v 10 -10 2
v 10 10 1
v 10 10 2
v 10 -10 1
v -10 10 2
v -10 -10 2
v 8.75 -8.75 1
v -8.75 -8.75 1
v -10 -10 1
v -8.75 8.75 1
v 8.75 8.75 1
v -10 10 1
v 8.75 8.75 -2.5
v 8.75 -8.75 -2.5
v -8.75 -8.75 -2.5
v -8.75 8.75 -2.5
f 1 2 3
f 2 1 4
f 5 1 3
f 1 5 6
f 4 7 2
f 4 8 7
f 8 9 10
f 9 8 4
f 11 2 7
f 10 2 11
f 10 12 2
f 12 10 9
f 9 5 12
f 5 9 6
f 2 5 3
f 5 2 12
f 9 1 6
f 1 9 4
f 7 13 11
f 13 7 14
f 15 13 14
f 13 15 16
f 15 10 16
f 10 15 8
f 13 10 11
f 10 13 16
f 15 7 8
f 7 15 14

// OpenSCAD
outerSize = 20;
innerSize = 18;
topHeight = 4;
baseHeight = 5;
foamWidth = 5;
foamHeight = 1.0;
spaceY = 2;
thickness = 1;
margin = 1.2;
tightMargin = 0.5;

module top() {
  $fn=100;
  $fs=1;
  translate([0, 0, baseHeight + spaceY])
  difference() {
    translate([0, 0, topHeight/2])
    cube([outerSize, outerSize, topHeight], center=true);
    translate([0, 0, topHeight/2-thickness])
    cube([innerSize, innerSize, topHeight], center=true);
  }

}

module base() {
  $fn=100;
  $fs=1;
  translate([0, 0, baseHeight/2])
  difference() {
    translate([0, 0, 0])
    cube([outerSize, outerSize, baseHeight], center=true);
    translate([0, 0, 0])
    cube([innerSize, innerSize, baseHeight+1], center=true);
  }

}

module buttonTop() {
  $fn=100;
  $fs=1;
  innerHeight = baseHeight - foamHeight - tightMargin;
  translate([0, 0, thickness])
  union() {
    translate([0, 0, thickness/2])
    cube([outerSize, outerSize, thickness], center=true);
    translate([0, 0, -innerHeight/2])
    cube([innerSize-tightMargin, innerSize-tightMargin, innerHeight], center=true);
  }
}

module buttonBottom() {
  $fn=100;
  $fs=1;
  height = baseHeight;
  innerHeight = baseHeight - foamHeight + margin;  
  translate([0, 0, 0])
  difference() {
    union() {
      translate([0, 0, baseHeight/2])
      cube([outerSize, outerSize, baseHeight], center=true);
      translate([0, 0, thickness+thickness/2])
      cube([outerSize/2, outerSize+thickness, thickness], center=true);
      translate([0, 0, thickness+thickness/2])
      cube([outerSize+thickness, outerSize/2, thickness], center=true);
    }
    translate([0, innerSize/2-foamWidth/2, height/2])
    cube([innerSize, foamWidth, height+thickness+1], center=true);
    translate([0, -innerSize/2+foamWidth/2, height/2])
    cube([innerSize, foamWidth, height+thickness+1], center=true);
    translate([0, 0, height/2])
    cube([innerSize, innerSize-foamWidth*2-thickness*2, height+thickness+1], center=true);
    translate([0, 0, innerHeight/2+foamHeight])
    cube([innerSize, innerSize, innerHeight+0.01], center=true);
  }

}

module buttonMountInner(innerWidth, width, height) {
  innerWidth2 = innerWidth + thickness + margin;
    union() {
	    translate([0, 0, height/2])
	    cube([innerWidth, innerWidth, height+1], center=true);
	    #translate([0, 0, thickness*2])
	    cube([innerWidth2, outerSize/2 + margin, thickness*4], center=true);
	    translate([0, 0, thickness*2])
	    cube([outerSize/2 + margin, innerWidth2, thickness*4], center=true);
	    translate([0, 0, thickness-0.5])
	    cube([innerWidth-thickness*2, width+1, thickness*2], center=true);
	    translate([0, 0, thickness-0.5])
	    cube([width+1, innerWidth-thickness*2, thickness*2], center=true);
    }
}

module buttonMount() {
  width = outerSize + thickness*6;
  spacing = 2.0;
  totalWidth = outerSize*2 + spacing*4;
  height = baseHeight;
  innerWidth = outerSize + margin;
  innerWidth2 = outerSize + thickness*2 + margin;
  translate([0, 0, -thickness*4])
  difference() {
    translate([0, 0, height/2])
    cube([totalWidth, totalWidth, height], center=true);

    translate([outerSize/2+spacing, outerSize/2+spacing, 0])
    buttonMountInner(innerWidth, width, height);

    translate([-outerSize/2-spacing, outerSize/2+spacing, 0])
    buttonMountInner(innerWidth, width, height);

    translate([outerSize/2+spacing, -outerSize/2-spacing, 0])
    buttonMountInner(innerWidth, width, height);

    translate([-outerSize/2-spacing, -outerSize/2-spacing, 0])
    buttonMountInner(innerWidth, width, height);
  }
}

*top();
*base();

buttonTop();

*translate([0, 0, -10])
buttonBottom();

*translate([45, 0, -10])
buttonMount();
